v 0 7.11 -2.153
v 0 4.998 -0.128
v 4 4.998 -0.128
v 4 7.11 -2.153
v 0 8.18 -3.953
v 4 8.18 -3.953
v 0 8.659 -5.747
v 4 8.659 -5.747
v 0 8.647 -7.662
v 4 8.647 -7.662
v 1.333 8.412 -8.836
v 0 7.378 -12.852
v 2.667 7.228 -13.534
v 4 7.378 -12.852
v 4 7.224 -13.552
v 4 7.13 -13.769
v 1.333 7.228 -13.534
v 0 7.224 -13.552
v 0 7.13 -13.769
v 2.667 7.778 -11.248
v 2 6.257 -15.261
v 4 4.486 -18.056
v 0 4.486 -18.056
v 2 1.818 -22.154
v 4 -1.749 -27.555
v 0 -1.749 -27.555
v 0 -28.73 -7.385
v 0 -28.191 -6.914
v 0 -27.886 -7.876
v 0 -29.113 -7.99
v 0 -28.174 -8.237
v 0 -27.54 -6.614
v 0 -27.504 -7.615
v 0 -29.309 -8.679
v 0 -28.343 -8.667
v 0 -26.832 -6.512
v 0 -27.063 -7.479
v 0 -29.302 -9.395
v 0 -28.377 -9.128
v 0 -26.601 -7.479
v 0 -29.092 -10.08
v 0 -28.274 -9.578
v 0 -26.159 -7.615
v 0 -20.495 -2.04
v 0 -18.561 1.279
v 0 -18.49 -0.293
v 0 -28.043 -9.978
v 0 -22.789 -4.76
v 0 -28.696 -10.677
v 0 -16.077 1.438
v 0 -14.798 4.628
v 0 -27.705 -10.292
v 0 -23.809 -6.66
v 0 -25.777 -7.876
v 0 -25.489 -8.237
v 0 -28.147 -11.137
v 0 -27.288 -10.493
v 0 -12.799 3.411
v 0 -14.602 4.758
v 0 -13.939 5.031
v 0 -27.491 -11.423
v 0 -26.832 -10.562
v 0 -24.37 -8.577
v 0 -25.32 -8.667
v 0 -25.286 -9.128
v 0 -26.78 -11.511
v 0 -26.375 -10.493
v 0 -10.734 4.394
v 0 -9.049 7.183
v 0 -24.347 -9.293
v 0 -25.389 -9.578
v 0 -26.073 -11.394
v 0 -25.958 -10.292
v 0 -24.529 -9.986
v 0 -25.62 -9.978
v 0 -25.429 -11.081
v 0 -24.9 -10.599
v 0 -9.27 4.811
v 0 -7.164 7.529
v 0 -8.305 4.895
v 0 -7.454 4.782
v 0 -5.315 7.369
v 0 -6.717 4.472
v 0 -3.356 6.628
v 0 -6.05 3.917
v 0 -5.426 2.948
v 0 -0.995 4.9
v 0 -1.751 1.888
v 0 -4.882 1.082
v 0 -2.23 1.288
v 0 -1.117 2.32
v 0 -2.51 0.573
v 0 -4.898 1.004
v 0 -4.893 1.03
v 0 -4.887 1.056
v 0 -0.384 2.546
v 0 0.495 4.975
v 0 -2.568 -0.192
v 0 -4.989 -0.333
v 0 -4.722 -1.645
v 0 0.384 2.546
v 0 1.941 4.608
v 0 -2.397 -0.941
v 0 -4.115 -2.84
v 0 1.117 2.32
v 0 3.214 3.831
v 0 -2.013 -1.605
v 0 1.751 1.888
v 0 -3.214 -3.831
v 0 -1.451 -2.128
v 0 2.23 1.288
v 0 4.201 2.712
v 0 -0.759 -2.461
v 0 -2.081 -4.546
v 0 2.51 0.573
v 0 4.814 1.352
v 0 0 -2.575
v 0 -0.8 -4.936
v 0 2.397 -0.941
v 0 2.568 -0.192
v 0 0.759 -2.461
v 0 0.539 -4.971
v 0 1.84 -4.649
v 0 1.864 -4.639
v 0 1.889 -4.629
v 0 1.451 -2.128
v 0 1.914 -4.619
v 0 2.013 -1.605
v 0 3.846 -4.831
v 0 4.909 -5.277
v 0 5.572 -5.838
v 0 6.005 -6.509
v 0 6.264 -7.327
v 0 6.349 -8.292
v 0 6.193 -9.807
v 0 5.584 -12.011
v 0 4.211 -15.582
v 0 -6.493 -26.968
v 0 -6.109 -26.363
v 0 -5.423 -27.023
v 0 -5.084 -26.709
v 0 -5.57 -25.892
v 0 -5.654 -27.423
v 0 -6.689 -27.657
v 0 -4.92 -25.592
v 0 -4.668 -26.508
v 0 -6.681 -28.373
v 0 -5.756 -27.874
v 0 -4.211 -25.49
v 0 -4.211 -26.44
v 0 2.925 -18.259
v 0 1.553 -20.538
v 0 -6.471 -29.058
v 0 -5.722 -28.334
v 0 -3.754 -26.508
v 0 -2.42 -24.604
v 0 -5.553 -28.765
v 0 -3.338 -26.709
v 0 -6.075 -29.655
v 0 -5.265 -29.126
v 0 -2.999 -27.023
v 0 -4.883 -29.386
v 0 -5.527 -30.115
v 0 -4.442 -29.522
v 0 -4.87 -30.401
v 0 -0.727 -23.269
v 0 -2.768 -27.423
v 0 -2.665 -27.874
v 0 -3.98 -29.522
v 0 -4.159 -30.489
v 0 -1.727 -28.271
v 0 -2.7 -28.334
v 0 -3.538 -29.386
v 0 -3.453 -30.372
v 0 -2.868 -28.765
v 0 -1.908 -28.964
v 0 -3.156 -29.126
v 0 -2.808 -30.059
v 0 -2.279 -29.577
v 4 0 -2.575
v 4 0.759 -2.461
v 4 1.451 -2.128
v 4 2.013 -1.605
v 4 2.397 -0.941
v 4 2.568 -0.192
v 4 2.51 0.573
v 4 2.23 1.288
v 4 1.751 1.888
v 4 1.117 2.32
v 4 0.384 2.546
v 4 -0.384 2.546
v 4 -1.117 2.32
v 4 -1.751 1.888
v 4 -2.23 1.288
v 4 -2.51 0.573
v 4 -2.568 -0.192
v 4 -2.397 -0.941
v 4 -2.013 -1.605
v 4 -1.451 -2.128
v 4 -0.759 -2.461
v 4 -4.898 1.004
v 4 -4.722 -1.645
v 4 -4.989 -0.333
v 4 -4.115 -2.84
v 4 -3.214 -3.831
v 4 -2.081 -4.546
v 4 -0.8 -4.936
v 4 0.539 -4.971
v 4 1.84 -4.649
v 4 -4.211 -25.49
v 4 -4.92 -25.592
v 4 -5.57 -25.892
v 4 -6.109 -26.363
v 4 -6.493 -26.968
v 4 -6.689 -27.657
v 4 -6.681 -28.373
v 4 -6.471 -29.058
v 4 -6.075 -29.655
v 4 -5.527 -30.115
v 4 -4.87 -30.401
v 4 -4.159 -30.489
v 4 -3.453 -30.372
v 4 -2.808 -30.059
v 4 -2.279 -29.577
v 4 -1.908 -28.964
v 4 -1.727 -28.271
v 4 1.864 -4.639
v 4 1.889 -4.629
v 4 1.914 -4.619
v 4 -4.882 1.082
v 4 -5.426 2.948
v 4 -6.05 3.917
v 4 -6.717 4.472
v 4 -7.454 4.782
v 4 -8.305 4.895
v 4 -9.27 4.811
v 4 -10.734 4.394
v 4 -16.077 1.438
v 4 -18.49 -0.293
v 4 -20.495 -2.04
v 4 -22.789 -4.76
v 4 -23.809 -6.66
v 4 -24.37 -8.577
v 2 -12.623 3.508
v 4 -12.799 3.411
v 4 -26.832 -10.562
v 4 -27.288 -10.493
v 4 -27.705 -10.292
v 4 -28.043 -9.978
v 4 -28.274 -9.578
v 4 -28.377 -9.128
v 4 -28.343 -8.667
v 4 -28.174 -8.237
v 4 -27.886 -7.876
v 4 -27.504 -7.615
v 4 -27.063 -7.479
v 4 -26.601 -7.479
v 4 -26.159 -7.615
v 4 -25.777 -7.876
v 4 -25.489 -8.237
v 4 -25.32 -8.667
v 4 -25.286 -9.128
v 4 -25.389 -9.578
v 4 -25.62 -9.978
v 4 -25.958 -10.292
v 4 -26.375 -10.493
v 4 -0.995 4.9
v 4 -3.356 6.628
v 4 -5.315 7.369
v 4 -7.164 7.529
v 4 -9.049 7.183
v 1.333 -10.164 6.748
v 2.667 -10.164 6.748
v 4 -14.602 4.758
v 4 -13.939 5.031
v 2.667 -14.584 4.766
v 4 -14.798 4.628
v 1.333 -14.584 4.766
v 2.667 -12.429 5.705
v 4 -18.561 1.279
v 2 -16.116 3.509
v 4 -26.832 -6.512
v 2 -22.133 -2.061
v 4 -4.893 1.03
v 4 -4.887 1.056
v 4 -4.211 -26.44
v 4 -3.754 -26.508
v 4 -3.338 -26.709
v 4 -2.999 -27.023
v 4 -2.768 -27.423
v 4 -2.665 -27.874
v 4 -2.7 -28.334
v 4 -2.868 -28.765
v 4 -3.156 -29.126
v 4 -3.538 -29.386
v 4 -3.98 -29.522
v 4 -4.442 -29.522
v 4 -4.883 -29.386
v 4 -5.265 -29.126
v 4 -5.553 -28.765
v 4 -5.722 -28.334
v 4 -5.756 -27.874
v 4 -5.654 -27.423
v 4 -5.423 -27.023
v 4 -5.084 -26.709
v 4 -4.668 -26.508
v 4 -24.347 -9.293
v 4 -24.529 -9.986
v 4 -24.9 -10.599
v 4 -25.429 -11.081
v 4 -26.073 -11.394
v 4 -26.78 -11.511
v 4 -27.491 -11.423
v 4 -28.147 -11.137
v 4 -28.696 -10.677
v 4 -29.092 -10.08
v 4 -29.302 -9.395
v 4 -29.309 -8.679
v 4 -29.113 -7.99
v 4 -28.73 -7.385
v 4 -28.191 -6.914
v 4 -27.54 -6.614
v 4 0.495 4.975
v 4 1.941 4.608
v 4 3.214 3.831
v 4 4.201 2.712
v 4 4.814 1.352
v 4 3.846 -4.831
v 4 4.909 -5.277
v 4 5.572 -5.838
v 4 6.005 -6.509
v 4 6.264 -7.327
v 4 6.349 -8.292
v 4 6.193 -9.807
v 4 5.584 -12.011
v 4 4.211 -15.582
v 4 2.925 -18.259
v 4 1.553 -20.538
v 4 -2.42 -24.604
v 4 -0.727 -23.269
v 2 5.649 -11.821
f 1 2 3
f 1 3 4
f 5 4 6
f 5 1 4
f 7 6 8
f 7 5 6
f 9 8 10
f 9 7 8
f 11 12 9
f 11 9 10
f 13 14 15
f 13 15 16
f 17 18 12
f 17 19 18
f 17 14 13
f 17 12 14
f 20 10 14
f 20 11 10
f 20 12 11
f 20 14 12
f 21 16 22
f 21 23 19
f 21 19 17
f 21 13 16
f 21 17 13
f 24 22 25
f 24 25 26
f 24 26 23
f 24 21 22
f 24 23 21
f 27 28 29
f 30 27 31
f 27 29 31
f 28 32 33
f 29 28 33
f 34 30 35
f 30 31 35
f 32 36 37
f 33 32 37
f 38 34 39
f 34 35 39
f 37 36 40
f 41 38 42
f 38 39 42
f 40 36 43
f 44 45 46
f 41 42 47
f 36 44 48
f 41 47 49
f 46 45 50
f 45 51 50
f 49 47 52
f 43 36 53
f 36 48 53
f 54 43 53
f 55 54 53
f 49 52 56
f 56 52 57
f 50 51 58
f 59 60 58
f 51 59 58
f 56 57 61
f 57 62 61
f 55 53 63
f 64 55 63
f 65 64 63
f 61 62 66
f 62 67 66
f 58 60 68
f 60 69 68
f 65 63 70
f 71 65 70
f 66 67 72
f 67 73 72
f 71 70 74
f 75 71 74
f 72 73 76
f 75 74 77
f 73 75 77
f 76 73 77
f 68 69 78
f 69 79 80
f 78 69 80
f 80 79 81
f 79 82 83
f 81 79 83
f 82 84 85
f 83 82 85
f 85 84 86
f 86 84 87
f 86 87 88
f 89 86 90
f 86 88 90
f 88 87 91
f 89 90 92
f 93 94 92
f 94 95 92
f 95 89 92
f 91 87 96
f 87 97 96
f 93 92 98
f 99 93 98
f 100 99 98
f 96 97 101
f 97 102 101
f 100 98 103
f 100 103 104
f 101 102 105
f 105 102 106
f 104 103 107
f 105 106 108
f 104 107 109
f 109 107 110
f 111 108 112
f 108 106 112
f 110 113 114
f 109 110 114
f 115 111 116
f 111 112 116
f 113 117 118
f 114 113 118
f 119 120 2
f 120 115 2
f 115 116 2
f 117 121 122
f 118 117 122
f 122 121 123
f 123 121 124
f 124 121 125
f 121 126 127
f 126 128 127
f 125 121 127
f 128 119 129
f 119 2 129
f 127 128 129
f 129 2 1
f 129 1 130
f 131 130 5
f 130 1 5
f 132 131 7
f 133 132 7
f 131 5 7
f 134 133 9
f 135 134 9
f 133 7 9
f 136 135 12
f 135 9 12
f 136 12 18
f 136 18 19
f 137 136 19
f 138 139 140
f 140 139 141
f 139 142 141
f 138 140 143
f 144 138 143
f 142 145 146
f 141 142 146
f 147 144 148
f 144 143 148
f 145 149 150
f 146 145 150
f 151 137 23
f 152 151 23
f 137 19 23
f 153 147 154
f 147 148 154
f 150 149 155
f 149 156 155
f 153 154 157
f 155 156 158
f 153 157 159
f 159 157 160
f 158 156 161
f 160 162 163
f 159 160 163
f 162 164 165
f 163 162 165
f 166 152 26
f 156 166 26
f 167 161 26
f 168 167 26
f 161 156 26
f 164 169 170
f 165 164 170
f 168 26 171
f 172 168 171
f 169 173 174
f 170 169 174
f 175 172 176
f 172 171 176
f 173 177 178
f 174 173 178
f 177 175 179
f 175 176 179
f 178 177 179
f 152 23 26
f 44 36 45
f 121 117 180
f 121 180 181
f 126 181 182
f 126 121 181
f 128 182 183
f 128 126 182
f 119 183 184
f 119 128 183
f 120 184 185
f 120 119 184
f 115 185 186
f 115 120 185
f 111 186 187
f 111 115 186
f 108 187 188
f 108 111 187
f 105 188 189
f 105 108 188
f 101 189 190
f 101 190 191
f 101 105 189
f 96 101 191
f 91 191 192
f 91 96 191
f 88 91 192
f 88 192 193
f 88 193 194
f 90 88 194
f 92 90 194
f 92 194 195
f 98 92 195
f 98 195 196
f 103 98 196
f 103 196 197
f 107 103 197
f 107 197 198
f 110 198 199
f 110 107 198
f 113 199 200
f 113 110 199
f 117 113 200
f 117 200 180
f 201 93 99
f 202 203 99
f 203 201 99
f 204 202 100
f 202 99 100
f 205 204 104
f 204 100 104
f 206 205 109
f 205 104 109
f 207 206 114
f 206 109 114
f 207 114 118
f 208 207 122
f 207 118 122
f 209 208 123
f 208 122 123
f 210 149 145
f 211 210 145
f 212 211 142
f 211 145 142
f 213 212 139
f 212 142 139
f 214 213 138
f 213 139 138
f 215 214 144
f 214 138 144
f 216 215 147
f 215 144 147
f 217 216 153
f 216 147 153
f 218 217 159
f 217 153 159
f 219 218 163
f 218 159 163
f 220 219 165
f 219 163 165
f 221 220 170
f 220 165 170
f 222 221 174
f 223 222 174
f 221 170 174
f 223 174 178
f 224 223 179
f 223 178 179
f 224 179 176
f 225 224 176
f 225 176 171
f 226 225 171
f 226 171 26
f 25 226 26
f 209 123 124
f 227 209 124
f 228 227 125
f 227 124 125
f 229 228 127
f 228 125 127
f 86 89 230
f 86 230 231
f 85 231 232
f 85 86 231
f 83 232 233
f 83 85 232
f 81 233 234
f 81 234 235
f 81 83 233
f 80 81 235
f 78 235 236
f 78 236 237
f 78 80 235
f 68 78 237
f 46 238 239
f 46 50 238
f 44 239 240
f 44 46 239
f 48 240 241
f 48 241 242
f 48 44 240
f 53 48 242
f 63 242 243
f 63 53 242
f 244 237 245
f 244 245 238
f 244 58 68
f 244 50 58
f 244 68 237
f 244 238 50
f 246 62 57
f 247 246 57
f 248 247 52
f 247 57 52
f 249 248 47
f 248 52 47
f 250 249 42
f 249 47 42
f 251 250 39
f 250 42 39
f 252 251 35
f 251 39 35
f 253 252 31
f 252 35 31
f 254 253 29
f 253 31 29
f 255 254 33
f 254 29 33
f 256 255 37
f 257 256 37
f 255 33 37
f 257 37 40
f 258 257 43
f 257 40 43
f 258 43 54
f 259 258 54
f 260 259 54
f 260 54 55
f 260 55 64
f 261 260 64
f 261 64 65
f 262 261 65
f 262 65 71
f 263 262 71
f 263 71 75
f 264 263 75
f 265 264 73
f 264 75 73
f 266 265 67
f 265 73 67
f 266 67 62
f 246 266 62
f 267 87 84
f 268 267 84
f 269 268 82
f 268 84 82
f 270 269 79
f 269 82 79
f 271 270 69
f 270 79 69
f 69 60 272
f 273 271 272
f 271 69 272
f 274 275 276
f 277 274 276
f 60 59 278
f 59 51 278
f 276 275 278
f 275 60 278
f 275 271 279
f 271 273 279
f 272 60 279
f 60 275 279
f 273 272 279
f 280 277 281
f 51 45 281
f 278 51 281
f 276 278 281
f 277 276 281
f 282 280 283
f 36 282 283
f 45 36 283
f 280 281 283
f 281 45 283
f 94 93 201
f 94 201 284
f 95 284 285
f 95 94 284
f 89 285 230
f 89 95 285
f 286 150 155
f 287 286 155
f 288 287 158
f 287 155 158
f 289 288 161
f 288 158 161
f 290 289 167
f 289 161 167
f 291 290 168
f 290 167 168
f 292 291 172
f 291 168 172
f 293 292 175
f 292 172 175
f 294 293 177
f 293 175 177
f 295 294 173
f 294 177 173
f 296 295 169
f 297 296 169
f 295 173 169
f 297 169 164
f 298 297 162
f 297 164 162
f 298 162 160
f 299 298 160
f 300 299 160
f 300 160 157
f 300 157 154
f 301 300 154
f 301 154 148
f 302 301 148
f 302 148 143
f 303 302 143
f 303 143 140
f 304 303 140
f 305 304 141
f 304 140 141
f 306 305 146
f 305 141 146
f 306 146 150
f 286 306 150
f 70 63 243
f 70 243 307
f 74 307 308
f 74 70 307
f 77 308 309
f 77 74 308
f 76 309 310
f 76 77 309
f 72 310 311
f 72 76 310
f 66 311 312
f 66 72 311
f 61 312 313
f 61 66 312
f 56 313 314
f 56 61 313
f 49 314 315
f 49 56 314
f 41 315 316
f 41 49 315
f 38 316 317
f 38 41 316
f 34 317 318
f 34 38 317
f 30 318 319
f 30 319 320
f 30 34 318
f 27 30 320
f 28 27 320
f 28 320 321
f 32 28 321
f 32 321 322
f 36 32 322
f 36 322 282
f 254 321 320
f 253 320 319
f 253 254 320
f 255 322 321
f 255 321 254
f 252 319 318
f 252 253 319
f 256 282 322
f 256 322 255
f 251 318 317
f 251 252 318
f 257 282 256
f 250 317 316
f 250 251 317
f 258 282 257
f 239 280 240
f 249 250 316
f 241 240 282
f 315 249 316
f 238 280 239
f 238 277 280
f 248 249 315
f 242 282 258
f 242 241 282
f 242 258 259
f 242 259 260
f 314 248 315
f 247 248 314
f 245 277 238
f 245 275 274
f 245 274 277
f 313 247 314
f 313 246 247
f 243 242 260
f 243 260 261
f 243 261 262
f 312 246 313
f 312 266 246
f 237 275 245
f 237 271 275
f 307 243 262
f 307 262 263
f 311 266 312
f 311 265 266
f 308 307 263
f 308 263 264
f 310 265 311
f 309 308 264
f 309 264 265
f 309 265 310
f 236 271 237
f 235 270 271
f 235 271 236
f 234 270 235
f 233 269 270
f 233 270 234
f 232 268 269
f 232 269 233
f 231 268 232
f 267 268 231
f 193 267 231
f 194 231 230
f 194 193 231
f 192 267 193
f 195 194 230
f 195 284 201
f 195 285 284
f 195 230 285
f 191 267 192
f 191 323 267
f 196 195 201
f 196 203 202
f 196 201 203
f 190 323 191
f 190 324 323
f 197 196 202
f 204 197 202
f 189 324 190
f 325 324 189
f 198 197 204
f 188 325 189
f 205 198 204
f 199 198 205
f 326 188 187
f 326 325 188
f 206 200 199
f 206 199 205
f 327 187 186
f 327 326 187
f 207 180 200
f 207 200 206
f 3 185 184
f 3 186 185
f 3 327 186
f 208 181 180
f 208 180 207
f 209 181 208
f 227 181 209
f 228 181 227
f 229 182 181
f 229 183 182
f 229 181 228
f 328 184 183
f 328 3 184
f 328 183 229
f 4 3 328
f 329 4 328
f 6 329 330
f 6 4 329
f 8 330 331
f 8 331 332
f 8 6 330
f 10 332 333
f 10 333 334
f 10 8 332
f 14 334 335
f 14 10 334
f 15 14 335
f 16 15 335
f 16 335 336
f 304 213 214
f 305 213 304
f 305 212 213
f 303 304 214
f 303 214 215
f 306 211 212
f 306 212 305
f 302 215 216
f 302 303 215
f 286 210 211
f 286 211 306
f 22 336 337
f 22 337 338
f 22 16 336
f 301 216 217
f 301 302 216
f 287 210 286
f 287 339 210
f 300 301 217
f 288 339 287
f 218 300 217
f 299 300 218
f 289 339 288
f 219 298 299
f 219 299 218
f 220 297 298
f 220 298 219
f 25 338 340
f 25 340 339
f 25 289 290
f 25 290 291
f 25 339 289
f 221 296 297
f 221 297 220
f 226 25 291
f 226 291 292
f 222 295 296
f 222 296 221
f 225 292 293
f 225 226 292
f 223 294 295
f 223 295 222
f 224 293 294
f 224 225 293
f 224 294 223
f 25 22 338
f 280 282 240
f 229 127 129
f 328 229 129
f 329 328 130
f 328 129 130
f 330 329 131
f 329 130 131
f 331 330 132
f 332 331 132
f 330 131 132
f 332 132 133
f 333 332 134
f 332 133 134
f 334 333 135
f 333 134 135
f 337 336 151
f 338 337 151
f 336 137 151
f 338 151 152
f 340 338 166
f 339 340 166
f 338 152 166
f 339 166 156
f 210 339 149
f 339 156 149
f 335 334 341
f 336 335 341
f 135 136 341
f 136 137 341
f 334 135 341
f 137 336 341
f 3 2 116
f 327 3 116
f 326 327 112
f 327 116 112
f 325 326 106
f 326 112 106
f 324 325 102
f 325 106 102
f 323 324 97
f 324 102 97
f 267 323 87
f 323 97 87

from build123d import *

# Parameters (mm, degrees)
SKETCH_1_R      = 5
SKETCH_1_R_2    = 2.575
EXTRUDE_1_DEPTH = 4
SKETCH_2_R      = 1.55
EXTRUDE_2_DEPTH = 4


with BuildPart() as part:
    # 草图1 → 凸台-拉伸1 (new body)
    with BuildSketch(Plane(origin=(0, 0, 0), x_dir=(0, 0, -1), z_dir=(1, 0, 0))):
        Circle(SKETCH_1_R)
        Circle(SKETCH_1_R_2, mode=Mode.SUBTRACT)
    extrude(amount=EXTRUDE_1_DEPTH)

    # 草图2 → 凸台-拉伸2 (add)
    # profile 1 of 2: a face of its own
    with BuildSketch(Plane.ZY):
        with BuildLine():
            Line((-0.127886673, 4.998364232), (-4.649231706, 1.839740347))
            ThreePointArc((-4.649231706, 1.839740347), (-4.634403006, 1.876781494), (-4.619279199, 1.913703132))
            add(Edge.make_bspline(
                [(-4.619279199, 1.913703132), (-4.562458027, 8.112413093), (-23.35589572, 1.733060959), (-25.489571125, -4.210748876)],
                knots=[0, 0, 0, 0.386205631, 1, 1, 1], degree=2))
            ThreePointArc((-25.489571125, -4.210748876), (-29.904822139, -5.817551153), (-27.55502197, -1.748805125))
            add(Edge.make_bspline(
                [(-0.127886673, 4.998364232), (-3.719458123, 9.77498219), (-12.729817731, 7.374971215), (-14.210505255, 7.104549869), (-27.55502197, -1.748805125)],
                knots=[0, 0, 0, 0.416313068, 0.733125741, 1, 1, 1], degree=2))
        make_face()
        with Locations((-27.989571125, -4.210748876)):
            Circle(SKETCH_2_R, mode=Mode.SUBTRACT)
    # profile 2 of 2: a face of its own
    with BuildSketch(Plane.ZY):
        with BuildLine():
            Line((4.900047416, -0.9947539), (1.003607016, -4.898241823))
            ThreePointArc((1.003607016, -4.898241823), (1.042661824, -4.890077333), (1.081650238, -4.881601455))
            add(Edge.make_bspline(
                [(1.081650238, -4.881601455), (7.195876975, -5.903102913), (-2.353034462, -23.301600674), (-8.577239391, -24.36964519)],
                knots=[0, 0, 0, 0.386205631, 1, 1, 1], degree=2))
            ThreePointArc((-8.577239391, -24.36964519), (-10.927039559, -28.438391217), (-6.511788546, -26.831588941))
            add(Edge.make_bspline(
                [(4.900047416, -0.9947539), (8.979667573, -5.361922773), (5.050013102, -13.817953089), (4.52633564, -15.229096301), (-6.511788546, -26.831588941)],
                knots=[0, 0, 0, 0.416313068, 0.733125741, 1, 1, 1], degree=2))
        make_face()
        with Locations(Location((-9.011788546, -26.831588941, 0), (0, 0, 180))):
            Circle(SKETCH_2_R, mode=Mode.SUBTRACT)
    extrude(amount=-EXTRUDE_2_DEPTH)


solid = part.part
